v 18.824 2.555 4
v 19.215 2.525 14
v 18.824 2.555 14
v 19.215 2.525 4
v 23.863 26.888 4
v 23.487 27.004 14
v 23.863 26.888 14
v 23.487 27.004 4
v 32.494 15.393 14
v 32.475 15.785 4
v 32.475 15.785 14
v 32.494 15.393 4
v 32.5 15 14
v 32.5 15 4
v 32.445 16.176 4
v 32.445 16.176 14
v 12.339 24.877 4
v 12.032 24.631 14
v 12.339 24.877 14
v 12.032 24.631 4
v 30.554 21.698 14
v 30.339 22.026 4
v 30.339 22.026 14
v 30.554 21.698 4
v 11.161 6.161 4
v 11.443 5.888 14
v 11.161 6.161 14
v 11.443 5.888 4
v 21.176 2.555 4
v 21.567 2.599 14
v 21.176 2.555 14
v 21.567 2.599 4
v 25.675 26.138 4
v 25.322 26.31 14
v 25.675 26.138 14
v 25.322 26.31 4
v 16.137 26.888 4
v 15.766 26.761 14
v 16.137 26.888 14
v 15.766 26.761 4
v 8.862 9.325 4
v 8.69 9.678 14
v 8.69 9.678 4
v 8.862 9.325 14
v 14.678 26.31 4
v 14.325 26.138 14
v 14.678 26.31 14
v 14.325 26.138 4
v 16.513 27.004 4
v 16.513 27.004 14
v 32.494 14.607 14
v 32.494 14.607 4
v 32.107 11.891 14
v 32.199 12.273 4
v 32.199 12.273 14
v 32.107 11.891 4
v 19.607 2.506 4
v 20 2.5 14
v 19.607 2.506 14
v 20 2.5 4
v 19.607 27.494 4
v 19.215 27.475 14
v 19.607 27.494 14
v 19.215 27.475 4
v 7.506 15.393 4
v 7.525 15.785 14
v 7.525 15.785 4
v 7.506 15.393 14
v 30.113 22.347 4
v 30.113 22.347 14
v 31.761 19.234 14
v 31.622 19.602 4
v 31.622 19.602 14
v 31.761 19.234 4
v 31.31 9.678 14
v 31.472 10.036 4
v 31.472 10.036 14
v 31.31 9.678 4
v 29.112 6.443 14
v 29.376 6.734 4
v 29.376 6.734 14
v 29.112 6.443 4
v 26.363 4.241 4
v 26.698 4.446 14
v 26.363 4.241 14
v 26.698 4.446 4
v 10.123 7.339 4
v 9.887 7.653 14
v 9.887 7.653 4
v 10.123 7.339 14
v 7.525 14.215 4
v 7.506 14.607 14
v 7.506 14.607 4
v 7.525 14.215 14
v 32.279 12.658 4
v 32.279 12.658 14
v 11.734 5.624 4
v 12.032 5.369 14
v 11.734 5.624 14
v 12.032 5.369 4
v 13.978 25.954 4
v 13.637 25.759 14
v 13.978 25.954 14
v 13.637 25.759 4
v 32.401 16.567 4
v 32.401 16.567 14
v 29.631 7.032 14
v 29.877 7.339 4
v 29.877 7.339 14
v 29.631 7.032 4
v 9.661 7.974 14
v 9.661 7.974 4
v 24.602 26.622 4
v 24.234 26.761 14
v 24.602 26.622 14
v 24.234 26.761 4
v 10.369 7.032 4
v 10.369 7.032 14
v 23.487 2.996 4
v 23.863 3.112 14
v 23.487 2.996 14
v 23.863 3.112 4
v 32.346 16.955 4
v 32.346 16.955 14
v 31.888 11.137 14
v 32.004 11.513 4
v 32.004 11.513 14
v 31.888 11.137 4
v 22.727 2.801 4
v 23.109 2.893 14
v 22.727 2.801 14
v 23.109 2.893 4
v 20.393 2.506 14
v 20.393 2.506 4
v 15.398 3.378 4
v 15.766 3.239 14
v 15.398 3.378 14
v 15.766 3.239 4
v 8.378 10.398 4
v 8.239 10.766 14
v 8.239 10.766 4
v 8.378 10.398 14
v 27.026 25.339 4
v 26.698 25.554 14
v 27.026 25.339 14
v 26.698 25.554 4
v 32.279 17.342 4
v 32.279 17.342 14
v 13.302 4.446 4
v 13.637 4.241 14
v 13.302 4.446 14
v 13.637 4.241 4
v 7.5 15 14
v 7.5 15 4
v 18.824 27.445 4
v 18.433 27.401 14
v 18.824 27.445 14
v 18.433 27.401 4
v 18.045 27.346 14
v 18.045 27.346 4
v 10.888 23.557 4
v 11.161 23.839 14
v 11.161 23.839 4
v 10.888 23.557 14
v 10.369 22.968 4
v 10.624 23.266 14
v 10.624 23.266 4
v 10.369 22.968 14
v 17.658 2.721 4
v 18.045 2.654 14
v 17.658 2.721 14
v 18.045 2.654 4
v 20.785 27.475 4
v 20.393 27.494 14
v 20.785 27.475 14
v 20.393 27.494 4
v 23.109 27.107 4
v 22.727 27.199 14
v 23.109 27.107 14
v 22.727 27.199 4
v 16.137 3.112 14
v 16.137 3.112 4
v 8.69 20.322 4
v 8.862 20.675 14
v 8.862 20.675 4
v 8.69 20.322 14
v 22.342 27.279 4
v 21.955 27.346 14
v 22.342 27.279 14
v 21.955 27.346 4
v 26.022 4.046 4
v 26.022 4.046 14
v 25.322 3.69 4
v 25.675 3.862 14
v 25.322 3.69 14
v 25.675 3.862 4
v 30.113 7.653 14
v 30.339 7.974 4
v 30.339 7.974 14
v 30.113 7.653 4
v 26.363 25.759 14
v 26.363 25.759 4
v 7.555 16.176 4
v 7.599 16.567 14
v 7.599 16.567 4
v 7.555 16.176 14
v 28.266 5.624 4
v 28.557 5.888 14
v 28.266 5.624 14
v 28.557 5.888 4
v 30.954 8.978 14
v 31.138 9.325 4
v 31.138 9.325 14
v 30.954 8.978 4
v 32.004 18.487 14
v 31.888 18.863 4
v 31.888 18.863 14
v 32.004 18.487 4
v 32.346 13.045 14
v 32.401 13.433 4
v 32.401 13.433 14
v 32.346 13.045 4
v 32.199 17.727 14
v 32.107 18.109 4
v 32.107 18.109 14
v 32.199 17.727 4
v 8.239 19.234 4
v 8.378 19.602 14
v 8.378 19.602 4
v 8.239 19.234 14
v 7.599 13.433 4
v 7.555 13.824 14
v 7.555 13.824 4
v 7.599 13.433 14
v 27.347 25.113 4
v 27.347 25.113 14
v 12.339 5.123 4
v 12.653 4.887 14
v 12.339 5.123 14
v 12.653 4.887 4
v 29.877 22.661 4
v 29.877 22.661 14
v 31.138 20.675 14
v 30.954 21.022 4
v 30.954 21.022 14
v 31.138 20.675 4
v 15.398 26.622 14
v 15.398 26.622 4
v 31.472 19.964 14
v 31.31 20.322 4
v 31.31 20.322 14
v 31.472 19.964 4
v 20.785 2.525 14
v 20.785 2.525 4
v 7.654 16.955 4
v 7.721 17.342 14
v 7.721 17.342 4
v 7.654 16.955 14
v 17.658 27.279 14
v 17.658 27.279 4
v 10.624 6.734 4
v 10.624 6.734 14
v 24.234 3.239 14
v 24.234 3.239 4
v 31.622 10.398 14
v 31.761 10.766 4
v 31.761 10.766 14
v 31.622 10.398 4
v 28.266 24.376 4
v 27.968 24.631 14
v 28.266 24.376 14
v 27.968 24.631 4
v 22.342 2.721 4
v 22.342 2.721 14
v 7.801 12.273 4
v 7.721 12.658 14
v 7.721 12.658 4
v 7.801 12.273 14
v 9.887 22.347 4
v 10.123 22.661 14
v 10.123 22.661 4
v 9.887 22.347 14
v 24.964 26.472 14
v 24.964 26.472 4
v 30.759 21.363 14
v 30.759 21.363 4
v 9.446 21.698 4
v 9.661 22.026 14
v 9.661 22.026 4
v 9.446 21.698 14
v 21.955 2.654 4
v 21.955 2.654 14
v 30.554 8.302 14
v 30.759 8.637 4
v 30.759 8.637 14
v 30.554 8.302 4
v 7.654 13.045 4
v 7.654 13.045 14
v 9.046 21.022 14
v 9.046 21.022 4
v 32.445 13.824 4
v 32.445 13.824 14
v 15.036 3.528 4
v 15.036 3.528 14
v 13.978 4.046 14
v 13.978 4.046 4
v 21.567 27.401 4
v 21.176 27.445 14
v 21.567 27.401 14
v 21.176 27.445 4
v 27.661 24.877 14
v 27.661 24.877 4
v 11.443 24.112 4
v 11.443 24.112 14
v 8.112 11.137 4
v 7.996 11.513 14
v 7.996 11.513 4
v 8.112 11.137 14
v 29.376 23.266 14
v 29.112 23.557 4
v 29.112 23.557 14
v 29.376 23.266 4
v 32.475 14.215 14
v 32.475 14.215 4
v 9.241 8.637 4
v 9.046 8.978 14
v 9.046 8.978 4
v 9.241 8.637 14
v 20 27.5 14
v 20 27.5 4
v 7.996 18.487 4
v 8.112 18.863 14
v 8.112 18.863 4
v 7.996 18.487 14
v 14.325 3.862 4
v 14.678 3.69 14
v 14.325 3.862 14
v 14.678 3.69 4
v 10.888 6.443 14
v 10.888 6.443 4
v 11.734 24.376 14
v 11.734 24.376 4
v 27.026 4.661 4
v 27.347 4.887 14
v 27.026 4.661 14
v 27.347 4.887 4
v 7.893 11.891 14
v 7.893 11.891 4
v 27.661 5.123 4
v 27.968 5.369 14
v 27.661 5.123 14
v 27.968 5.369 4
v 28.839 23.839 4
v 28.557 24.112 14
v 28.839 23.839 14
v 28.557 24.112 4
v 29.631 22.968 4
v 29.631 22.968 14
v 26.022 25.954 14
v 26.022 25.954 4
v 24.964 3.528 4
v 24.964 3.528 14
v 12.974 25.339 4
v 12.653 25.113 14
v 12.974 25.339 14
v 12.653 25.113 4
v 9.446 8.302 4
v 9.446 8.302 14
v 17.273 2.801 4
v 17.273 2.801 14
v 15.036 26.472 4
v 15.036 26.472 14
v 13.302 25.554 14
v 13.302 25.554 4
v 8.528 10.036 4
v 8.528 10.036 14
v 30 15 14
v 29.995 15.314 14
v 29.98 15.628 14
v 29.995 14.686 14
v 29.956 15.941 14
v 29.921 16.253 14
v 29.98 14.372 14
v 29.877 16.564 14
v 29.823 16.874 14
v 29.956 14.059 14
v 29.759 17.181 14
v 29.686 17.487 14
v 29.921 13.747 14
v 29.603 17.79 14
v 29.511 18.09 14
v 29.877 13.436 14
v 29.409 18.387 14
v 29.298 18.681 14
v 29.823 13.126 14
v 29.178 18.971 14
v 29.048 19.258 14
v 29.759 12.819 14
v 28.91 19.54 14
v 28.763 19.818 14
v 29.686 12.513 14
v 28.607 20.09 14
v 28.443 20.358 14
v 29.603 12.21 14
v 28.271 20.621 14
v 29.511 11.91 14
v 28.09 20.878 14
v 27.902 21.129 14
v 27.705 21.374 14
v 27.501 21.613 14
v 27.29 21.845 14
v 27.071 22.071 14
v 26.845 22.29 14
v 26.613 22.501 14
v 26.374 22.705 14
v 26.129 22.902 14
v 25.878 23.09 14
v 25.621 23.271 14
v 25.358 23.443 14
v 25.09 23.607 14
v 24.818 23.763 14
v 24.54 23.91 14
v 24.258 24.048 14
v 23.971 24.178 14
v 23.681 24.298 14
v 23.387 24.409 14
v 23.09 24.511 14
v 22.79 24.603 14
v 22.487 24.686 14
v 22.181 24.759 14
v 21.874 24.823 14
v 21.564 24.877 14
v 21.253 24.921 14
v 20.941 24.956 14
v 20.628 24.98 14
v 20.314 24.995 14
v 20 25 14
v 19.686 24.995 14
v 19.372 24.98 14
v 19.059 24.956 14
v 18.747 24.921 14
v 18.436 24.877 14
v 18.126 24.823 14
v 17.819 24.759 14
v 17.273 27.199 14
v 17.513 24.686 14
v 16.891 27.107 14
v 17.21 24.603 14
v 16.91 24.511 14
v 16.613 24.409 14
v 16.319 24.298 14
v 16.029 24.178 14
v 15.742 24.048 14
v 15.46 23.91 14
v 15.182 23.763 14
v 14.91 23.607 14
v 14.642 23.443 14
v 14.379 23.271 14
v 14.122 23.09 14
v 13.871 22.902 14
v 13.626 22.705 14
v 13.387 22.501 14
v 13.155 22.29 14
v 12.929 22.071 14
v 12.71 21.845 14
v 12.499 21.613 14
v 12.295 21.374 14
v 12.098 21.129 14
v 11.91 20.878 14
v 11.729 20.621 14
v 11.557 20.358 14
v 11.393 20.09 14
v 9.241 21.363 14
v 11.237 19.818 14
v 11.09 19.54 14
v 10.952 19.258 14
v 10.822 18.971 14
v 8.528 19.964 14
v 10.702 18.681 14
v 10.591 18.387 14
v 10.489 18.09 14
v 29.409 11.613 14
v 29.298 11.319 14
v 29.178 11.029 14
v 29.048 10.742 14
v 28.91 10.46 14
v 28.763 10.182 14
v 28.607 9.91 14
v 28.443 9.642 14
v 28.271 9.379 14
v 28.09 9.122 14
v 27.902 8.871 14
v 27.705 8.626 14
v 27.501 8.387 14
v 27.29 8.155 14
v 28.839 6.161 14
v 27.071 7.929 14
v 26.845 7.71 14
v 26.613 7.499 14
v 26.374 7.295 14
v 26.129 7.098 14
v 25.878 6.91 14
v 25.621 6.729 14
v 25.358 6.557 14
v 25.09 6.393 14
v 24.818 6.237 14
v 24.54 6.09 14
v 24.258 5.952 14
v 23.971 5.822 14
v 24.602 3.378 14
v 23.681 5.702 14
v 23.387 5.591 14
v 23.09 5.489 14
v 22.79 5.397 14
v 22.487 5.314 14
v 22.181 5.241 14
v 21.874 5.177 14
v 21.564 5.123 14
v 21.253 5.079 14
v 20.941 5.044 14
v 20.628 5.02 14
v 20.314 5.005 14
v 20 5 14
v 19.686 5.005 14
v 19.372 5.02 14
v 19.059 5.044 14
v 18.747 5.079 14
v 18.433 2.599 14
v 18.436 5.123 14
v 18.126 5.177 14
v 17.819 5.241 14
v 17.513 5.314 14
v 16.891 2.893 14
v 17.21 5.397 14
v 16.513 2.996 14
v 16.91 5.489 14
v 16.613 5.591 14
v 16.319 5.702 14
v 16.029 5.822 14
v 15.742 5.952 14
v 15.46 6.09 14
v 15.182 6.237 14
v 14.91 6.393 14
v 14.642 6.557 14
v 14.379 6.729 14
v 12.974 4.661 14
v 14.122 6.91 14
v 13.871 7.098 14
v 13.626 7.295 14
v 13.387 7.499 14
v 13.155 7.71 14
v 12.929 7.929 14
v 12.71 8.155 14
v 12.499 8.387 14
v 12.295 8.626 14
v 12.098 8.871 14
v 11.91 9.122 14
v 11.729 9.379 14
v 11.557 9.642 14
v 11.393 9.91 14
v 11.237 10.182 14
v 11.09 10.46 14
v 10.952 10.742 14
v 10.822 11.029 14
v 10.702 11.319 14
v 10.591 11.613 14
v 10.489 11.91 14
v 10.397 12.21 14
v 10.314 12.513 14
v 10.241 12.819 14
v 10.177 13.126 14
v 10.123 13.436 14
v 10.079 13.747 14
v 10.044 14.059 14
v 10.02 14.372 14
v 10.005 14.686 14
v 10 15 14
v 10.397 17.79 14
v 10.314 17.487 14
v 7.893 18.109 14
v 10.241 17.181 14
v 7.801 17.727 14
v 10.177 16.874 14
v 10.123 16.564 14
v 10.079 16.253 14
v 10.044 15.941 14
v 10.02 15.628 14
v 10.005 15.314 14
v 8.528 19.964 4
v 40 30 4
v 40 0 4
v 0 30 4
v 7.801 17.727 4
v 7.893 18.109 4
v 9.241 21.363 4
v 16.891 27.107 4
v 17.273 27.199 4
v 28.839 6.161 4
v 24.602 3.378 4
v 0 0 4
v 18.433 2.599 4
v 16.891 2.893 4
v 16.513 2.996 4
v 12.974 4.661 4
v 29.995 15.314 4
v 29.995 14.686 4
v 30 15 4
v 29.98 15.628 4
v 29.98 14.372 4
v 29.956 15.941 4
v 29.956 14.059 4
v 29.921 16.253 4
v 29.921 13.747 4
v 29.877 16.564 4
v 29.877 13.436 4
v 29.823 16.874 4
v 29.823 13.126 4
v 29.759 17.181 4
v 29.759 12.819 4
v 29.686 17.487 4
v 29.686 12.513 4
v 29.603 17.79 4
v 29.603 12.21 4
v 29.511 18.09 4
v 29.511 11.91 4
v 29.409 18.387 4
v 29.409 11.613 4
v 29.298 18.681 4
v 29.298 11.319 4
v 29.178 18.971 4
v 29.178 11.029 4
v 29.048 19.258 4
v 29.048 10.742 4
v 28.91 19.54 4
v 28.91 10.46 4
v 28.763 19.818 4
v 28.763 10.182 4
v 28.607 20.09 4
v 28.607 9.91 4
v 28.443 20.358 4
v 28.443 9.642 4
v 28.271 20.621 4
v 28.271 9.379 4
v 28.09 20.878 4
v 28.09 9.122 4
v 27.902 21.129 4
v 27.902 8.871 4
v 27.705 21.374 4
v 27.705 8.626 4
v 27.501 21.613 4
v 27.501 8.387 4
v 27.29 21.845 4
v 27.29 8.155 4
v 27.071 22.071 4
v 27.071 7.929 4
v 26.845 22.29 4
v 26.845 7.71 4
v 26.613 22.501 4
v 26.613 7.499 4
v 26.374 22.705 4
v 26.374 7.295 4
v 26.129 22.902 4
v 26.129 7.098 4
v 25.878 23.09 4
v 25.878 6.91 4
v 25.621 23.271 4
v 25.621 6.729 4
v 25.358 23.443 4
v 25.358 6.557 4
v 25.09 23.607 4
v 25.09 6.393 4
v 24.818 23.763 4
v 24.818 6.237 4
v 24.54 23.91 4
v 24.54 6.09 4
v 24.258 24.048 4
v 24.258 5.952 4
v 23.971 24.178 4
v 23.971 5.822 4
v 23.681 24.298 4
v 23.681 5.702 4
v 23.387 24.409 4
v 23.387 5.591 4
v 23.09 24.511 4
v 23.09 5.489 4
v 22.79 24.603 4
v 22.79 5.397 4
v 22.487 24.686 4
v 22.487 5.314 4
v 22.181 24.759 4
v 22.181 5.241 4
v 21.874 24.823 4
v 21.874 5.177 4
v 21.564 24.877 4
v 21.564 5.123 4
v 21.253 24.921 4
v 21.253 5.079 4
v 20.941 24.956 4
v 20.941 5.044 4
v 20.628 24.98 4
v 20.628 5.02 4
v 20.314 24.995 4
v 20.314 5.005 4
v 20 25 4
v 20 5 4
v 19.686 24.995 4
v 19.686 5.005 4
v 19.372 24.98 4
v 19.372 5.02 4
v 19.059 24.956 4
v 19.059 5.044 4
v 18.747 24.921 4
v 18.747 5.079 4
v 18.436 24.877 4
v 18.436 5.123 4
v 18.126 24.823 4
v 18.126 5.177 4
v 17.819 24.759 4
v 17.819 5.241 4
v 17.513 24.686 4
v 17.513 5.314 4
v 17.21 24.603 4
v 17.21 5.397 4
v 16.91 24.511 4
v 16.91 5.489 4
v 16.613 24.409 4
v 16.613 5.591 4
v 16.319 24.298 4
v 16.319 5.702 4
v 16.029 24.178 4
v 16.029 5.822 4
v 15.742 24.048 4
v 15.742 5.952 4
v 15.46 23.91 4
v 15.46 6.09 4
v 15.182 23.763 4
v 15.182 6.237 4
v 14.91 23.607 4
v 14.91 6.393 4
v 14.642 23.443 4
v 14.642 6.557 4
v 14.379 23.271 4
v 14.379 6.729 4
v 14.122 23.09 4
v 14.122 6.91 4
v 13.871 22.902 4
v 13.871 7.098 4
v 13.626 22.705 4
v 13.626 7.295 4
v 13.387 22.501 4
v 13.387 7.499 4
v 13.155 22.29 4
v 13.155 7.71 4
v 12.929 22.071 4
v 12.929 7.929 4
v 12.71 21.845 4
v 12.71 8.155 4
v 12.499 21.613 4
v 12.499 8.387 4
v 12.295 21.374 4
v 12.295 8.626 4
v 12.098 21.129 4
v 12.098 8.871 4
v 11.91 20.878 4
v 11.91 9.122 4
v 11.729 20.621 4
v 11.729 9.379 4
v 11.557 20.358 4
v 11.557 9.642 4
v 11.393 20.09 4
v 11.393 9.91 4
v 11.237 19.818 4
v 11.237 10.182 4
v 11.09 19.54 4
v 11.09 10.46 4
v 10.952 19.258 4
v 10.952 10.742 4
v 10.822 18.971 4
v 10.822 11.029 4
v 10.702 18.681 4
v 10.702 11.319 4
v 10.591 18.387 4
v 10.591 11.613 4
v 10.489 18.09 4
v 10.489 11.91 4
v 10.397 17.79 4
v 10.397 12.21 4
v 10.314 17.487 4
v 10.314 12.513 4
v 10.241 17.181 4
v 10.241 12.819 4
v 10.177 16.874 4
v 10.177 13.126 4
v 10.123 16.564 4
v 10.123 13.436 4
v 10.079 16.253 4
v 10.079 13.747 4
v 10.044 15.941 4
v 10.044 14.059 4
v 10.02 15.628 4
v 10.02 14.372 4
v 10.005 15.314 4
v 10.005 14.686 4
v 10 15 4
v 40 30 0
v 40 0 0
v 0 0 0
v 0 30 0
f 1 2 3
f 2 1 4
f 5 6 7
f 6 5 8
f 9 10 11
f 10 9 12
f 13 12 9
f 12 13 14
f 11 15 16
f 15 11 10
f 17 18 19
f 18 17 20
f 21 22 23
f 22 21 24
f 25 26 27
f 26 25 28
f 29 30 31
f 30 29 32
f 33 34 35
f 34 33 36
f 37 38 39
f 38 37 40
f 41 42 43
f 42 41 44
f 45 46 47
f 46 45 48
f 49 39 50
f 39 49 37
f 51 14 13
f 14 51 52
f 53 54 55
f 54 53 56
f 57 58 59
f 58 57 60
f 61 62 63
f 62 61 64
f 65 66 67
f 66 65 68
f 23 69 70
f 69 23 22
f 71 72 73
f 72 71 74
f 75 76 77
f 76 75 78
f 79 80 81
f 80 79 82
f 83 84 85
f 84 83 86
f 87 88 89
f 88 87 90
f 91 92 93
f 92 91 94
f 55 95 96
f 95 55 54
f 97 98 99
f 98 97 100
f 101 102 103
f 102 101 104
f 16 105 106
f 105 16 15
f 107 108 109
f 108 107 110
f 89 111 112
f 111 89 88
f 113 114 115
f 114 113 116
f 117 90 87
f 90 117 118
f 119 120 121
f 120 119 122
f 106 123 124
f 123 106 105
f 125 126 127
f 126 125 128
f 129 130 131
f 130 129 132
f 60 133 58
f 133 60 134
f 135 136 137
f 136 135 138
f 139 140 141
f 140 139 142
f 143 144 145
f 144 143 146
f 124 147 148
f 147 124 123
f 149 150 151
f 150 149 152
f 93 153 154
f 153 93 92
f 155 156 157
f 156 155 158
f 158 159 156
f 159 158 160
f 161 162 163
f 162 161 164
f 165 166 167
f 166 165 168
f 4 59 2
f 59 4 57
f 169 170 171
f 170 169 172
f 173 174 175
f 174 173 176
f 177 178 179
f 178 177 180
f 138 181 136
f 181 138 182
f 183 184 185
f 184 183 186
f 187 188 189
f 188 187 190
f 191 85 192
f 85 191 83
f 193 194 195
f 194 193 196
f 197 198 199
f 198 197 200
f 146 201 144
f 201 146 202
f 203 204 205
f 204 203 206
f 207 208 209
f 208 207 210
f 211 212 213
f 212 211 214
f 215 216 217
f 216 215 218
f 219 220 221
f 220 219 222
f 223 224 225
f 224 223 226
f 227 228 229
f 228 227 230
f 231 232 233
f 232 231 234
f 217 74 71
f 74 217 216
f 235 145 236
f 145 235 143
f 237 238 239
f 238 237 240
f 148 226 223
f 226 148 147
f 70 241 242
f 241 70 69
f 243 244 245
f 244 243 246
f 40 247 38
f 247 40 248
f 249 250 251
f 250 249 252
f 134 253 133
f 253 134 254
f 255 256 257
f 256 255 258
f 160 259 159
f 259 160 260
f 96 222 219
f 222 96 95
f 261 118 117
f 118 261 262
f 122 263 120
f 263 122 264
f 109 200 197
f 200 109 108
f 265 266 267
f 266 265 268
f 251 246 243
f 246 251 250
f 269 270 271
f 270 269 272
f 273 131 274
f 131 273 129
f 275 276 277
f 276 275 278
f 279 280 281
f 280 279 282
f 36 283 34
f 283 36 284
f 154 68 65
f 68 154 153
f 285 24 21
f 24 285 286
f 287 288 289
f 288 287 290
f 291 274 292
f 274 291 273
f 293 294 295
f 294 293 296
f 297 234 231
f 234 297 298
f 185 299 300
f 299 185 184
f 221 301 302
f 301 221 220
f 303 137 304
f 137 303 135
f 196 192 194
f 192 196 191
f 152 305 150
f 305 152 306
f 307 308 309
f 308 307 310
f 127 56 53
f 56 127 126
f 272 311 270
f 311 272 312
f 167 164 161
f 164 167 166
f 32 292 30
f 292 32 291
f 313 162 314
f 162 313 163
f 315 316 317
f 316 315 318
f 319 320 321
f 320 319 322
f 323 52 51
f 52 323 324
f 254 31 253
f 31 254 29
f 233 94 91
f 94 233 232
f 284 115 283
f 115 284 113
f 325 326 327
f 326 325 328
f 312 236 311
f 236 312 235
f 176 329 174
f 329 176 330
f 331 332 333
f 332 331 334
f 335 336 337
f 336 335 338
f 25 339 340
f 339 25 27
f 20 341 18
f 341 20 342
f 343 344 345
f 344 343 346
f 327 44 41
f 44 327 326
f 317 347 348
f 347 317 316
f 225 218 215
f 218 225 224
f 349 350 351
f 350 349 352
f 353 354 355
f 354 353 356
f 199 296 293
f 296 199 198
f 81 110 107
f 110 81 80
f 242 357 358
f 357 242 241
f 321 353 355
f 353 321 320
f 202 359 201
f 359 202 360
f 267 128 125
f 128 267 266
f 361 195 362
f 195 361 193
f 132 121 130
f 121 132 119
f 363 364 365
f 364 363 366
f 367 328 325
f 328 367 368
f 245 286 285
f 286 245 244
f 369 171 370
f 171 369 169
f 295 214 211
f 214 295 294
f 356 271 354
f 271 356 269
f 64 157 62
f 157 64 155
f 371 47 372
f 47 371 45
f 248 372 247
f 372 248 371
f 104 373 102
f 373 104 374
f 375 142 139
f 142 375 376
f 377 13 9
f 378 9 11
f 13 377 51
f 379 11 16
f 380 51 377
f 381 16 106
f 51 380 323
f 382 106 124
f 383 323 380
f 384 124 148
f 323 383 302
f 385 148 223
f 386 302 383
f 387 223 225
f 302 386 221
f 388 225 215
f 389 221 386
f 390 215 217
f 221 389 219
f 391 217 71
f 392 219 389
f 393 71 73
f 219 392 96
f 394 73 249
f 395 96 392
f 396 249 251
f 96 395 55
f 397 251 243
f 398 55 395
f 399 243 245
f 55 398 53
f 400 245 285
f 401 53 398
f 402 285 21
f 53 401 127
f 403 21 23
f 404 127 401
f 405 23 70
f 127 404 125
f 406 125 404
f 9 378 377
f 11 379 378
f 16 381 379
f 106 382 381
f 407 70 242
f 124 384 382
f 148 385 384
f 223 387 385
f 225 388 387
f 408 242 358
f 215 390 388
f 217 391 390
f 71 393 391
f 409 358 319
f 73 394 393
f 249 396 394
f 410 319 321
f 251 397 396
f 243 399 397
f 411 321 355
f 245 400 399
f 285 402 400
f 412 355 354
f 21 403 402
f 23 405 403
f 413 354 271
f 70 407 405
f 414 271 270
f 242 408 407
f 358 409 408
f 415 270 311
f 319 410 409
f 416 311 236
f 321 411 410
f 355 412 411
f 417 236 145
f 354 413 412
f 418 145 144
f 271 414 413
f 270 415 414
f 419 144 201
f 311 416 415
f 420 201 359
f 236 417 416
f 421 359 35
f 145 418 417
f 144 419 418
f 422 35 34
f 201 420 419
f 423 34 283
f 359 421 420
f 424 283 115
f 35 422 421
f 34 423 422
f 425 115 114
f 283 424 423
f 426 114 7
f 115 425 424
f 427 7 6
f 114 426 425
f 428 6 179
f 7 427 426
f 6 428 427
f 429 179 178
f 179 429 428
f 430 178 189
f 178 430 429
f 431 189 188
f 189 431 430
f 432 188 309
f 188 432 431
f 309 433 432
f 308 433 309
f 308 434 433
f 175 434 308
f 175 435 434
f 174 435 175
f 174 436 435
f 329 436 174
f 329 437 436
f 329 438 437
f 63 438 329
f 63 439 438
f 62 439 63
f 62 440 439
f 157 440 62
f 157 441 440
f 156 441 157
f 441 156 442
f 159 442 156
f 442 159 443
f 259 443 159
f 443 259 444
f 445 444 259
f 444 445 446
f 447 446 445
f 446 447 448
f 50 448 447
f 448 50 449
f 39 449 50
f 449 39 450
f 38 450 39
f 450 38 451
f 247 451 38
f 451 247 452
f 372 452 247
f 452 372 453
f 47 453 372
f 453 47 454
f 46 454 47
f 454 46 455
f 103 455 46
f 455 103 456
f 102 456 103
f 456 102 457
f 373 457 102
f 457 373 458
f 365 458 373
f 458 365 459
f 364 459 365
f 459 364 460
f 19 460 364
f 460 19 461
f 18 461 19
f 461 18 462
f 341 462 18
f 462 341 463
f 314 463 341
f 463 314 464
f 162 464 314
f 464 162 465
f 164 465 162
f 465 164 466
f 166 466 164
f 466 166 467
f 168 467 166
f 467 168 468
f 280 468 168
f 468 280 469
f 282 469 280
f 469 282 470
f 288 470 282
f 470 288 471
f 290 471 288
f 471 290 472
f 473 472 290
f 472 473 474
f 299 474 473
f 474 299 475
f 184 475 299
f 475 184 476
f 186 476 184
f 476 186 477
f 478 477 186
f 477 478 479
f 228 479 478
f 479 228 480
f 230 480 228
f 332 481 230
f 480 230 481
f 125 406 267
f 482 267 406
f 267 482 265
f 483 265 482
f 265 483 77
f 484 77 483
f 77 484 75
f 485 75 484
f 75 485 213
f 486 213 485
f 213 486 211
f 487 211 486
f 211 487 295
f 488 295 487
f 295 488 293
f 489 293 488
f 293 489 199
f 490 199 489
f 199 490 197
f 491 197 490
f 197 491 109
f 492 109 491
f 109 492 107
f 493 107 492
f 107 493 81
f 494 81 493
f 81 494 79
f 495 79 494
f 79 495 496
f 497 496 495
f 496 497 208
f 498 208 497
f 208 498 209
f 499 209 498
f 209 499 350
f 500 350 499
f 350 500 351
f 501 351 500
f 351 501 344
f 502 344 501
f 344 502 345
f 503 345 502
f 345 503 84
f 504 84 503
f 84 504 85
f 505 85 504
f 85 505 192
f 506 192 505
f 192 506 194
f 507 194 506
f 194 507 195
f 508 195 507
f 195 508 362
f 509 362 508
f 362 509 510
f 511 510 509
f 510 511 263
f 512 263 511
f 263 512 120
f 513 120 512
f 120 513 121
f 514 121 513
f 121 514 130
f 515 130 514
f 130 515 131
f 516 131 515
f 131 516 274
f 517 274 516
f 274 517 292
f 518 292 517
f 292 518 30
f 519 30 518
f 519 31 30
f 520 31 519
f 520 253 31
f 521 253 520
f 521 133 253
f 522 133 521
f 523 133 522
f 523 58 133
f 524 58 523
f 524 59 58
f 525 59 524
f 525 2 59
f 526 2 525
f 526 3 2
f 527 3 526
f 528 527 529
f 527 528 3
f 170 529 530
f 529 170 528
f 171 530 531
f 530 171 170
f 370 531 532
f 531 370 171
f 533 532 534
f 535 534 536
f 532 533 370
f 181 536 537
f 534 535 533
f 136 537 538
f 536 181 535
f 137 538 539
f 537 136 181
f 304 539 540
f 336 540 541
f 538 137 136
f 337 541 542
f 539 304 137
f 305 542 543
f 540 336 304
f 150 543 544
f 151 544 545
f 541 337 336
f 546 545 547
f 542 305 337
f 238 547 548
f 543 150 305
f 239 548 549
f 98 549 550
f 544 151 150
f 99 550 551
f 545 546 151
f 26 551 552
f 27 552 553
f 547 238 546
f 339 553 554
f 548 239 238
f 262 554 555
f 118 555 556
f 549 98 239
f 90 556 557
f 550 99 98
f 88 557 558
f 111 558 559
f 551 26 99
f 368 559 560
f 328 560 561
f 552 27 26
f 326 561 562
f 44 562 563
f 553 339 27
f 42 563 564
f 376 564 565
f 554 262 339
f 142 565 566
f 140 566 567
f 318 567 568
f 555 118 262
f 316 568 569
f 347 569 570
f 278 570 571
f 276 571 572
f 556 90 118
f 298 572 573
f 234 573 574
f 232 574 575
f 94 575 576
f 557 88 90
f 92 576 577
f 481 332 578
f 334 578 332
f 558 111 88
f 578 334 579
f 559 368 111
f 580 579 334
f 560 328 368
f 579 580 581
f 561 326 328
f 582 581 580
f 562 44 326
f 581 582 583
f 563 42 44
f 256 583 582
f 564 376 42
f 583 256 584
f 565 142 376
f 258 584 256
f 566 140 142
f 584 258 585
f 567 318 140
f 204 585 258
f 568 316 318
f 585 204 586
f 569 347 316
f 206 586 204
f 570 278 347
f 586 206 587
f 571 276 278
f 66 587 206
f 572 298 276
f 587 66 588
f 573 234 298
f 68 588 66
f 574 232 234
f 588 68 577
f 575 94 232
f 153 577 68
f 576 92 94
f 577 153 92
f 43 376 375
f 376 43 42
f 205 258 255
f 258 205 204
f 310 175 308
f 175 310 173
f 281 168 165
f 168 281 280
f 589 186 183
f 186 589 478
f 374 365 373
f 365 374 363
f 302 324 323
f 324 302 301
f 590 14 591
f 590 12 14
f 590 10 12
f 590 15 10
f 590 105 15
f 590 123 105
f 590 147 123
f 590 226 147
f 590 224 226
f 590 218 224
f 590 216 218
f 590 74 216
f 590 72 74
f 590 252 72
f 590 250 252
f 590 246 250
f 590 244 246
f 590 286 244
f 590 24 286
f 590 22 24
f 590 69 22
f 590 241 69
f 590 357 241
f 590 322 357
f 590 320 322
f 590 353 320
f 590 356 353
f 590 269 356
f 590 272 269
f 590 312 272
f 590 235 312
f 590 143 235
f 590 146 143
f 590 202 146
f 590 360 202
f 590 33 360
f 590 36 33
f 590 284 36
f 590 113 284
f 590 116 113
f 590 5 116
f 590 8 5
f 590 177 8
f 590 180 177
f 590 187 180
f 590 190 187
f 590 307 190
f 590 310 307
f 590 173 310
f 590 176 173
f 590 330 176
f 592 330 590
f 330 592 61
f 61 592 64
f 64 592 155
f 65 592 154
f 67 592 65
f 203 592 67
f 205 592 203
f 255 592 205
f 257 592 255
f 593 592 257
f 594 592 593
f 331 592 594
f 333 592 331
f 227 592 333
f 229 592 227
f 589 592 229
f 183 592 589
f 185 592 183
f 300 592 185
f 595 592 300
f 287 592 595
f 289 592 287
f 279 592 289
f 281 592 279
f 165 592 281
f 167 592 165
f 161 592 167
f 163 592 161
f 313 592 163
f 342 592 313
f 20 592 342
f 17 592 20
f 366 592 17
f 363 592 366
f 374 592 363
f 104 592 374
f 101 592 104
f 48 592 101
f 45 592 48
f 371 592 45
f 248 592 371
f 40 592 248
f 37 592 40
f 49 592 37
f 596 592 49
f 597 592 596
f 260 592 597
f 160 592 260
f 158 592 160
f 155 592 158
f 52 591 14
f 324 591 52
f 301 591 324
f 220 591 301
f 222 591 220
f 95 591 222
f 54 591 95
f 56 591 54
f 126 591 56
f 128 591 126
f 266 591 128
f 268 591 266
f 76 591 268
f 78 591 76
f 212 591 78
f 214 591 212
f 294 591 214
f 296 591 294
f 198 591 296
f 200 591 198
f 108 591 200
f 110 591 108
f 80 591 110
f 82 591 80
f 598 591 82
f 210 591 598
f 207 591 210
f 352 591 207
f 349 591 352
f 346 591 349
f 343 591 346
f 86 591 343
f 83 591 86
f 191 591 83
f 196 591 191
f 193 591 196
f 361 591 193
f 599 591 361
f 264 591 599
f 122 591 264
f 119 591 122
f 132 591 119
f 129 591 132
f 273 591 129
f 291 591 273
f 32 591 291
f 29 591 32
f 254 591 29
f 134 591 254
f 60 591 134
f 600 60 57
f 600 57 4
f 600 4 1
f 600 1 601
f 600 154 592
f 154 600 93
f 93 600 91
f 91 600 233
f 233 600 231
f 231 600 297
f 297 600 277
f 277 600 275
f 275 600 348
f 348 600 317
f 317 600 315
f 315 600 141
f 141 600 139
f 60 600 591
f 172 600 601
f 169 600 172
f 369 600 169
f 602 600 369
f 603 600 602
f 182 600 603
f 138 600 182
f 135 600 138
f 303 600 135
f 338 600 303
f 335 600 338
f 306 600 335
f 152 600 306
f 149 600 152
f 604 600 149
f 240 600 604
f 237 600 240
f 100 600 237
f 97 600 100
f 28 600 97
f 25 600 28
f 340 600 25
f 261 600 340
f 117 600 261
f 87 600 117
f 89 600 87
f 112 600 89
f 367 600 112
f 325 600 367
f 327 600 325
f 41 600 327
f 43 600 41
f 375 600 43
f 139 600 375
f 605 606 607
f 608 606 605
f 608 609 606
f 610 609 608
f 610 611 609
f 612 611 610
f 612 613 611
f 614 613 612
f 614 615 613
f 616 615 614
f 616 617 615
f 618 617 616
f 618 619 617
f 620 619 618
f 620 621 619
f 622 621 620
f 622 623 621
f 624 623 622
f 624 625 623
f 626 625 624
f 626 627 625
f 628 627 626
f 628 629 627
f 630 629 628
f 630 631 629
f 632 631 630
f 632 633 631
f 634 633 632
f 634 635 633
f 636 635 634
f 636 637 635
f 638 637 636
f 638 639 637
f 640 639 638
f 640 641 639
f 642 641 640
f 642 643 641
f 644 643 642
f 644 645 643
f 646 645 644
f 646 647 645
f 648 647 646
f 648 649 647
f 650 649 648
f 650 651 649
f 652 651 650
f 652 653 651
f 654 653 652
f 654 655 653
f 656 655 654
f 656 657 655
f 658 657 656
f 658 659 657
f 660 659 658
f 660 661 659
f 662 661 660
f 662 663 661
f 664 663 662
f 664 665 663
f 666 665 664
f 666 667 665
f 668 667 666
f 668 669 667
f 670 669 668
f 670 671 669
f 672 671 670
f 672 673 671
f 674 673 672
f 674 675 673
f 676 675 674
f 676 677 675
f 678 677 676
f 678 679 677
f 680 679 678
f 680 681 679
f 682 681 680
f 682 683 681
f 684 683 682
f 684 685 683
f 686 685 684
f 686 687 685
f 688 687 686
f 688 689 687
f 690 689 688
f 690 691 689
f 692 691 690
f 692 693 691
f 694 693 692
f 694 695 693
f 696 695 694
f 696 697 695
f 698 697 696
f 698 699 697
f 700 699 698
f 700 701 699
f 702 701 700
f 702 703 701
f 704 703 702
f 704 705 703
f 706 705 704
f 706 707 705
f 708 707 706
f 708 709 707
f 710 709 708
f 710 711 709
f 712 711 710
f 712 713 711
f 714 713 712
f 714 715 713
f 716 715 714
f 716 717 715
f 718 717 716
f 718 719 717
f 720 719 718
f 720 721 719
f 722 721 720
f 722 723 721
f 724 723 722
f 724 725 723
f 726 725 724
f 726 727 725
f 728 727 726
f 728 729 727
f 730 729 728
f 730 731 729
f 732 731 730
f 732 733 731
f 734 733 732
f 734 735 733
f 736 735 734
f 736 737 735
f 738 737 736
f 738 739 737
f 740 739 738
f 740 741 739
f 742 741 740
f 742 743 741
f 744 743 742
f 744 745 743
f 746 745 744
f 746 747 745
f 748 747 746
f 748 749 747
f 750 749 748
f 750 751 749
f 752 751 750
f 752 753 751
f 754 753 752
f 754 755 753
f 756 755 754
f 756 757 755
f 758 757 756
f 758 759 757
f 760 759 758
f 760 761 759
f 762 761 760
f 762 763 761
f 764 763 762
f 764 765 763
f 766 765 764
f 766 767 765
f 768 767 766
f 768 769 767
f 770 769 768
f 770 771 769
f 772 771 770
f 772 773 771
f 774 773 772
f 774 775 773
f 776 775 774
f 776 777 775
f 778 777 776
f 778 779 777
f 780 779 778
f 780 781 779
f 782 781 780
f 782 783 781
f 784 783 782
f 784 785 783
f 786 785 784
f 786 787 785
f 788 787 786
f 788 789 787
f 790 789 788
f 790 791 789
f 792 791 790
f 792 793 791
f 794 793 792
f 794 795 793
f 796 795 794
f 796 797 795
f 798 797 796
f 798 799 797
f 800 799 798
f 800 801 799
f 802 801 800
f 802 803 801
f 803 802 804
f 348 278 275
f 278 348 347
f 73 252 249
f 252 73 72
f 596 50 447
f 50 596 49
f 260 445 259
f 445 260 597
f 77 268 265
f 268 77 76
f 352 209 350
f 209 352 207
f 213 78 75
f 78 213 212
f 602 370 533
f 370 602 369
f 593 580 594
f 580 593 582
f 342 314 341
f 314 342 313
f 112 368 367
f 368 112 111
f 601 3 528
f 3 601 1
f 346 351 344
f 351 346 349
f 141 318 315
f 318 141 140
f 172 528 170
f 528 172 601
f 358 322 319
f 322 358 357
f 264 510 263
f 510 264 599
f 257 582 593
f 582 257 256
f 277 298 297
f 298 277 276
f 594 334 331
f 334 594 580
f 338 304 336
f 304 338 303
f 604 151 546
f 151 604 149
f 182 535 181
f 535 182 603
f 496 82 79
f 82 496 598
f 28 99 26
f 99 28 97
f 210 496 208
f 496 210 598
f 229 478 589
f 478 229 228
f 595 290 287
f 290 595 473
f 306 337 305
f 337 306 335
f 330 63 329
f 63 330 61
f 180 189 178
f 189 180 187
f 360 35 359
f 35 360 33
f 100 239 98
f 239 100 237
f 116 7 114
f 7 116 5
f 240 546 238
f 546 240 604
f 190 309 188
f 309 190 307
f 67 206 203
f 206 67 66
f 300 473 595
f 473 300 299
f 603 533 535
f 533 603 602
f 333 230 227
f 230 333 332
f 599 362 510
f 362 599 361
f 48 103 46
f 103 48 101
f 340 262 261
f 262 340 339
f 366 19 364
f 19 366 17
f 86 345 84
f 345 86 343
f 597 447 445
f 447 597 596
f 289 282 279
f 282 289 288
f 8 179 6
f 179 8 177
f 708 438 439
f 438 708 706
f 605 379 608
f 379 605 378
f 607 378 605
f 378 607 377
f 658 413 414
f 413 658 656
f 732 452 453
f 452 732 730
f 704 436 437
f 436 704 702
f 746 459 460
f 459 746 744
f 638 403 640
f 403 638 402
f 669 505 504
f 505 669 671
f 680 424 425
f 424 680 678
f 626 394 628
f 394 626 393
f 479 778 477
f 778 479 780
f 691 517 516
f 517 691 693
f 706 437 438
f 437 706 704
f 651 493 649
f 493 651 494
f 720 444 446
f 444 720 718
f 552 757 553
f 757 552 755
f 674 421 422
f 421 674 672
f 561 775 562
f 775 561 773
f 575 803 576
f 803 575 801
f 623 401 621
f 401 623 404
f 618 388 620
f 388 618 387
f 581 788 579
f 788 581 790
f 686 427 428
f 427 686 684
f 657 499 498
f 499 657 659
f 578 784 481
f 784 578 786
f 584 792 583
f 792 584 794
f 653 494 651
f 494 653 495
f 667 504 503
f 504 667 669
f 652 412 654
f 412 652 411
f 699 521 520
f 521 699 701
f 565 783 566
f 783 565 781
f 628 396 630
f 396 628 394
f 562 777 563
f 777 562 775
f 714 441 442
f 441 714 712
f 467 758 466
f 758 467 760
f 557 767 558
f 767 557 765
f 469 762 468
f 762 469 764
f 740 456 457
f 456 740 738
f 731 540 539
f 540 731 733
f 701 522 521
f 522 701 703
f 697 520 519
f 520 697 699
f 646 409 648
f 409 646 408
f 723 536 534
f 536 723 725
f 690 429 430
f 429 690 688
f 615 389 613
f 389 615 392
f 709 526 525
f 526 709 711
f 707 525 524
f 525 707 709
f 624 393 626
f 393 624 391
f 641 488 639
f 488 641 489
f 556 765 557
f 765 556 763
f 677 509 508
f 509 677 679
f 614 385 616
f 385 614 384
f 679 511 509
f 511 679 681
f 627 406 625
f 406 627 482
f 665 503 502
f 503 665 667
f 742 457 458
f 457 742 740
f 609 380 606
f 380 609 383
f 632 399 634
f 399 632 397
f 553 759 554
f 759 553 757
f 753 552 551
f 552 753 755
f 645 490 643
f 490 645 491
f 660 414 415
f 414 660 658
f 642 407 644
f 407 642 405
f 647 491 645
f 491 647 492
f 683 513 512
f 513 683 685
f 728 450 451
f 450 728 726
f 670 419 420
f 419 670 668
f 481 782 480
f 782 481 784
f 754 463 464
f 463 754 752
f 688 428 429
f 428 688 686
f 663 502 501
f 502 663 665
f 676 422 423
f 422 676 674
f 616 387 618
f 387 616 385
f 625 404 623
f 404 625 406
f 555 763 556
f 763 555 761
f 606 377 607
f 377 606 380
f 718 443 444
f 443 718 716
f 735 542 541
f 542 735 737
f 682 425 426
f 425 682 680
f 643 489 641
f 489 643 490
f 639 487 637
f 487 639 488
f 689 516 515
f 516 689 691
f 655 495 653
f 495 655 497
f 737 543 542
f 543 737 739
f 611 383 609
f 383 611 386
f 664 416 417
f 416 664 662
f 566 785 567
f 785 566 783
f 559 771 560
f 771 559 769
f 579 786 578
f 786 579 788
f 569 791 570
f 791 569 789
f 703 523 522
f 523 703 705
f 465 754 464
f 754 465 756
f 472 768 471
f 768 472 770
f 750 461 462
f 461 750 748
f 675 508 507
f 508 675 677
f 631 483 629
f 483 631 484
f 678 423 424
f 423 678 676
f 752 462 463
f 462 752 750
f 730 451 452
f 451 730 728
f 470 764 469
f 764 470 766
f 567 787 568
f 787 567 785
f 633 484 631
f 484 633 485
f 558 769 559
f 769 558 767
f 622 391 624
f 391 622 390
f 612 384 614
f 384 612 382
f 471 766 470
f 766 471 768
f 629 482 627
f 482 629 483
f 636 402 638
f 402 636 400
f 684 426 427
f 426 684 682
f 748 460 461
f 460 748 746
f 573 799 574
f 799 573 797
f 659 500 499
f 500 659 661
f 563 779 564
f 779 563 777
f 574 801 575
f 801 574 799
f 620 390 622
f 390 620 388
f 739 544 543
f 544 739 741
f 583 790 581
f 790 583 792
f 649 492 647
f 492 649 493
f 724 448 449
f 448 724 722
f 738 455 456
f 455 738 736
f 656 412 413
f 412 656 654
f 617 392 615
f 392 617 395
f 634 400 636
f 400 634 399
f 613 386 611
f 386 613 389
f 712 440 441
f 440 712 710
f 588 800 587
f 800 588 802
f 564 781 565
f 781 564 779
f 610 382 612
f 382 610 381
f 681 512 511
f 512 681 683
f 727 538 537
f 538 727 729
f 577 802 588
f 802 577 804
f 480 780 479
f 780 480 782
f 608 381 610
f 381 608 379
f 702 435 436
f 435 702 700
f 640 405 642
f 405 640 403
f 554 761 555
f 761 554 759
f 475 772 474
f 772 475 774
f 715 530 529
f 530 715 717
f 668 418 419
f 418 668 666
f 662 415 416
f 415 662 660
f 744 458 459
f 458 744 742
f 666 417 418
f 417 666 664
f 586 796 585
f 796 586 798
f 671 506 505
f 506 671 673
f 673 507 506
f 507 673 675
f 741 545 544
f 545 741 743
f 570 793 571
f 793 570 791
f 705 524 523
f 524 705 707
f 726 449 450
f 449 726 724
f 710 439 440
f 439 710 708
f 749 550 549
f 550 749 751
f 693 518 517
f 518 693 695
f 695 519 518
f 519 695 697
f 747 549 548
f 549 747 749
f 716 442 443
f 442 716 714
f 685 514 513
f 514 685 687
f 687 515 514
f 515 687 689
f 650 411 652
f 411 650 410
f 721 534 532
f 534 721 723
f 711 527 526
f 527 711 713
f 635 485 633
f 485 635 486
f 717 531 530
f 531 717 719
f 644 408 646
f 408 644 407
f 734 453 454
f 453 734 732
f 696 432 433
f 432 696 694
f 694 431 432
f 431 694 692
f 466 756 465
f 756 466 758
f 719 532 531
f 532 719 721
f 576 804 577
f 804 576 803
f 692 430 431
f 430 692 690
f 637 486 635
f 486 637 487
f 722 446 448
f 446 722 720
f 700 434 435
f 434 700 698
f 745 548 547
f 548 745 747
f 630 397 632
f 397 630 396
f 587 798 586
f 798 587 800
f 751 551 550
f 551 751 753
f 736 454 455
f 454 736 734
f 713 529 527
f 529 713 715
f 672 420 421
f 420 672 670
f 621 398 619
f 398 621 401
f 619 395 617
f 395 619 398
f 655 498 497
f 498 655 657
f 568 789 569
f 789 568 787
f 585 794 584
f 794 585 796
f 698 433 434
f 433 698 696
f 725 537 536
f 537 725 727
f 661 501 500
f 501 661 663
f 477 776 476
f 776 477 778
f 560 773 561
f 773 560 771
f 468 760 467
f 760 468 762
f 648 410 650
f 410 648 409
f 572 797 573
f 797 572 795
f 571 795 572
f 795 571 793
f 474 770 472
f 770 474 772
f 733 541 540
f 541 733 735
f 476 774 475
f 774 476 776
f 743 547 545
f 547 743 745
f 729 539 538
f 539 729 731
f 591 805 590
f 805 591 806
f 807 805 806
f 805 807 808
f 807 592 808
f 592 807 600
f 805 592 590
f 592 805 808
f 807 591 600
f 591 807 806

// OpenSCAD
// Feet for radiator support rods

{
  base_width_x = 40;
  base_width_y = 30;
  base_width_z = 4;

  internal_diameter = 20;
  external_diameter = 25;
  
  center_x = base_width_x/2;
  center_y = base_width_y/2;
  center_z = base_width_z;

  tube_support_z = 10;

  $fn = 200;
}

cube([base_width_x, base_width_y, base_width_z]);
difference() {
  translate([center_x, center_y, center_z]) {
    cylinder(d=external_diameter, h=tube_support_z);
  }
  translate([center_x, center_y, center_z]) {
    cylinder(d=internal_diameter, h=tube_support_z+0.2);
  }
}
